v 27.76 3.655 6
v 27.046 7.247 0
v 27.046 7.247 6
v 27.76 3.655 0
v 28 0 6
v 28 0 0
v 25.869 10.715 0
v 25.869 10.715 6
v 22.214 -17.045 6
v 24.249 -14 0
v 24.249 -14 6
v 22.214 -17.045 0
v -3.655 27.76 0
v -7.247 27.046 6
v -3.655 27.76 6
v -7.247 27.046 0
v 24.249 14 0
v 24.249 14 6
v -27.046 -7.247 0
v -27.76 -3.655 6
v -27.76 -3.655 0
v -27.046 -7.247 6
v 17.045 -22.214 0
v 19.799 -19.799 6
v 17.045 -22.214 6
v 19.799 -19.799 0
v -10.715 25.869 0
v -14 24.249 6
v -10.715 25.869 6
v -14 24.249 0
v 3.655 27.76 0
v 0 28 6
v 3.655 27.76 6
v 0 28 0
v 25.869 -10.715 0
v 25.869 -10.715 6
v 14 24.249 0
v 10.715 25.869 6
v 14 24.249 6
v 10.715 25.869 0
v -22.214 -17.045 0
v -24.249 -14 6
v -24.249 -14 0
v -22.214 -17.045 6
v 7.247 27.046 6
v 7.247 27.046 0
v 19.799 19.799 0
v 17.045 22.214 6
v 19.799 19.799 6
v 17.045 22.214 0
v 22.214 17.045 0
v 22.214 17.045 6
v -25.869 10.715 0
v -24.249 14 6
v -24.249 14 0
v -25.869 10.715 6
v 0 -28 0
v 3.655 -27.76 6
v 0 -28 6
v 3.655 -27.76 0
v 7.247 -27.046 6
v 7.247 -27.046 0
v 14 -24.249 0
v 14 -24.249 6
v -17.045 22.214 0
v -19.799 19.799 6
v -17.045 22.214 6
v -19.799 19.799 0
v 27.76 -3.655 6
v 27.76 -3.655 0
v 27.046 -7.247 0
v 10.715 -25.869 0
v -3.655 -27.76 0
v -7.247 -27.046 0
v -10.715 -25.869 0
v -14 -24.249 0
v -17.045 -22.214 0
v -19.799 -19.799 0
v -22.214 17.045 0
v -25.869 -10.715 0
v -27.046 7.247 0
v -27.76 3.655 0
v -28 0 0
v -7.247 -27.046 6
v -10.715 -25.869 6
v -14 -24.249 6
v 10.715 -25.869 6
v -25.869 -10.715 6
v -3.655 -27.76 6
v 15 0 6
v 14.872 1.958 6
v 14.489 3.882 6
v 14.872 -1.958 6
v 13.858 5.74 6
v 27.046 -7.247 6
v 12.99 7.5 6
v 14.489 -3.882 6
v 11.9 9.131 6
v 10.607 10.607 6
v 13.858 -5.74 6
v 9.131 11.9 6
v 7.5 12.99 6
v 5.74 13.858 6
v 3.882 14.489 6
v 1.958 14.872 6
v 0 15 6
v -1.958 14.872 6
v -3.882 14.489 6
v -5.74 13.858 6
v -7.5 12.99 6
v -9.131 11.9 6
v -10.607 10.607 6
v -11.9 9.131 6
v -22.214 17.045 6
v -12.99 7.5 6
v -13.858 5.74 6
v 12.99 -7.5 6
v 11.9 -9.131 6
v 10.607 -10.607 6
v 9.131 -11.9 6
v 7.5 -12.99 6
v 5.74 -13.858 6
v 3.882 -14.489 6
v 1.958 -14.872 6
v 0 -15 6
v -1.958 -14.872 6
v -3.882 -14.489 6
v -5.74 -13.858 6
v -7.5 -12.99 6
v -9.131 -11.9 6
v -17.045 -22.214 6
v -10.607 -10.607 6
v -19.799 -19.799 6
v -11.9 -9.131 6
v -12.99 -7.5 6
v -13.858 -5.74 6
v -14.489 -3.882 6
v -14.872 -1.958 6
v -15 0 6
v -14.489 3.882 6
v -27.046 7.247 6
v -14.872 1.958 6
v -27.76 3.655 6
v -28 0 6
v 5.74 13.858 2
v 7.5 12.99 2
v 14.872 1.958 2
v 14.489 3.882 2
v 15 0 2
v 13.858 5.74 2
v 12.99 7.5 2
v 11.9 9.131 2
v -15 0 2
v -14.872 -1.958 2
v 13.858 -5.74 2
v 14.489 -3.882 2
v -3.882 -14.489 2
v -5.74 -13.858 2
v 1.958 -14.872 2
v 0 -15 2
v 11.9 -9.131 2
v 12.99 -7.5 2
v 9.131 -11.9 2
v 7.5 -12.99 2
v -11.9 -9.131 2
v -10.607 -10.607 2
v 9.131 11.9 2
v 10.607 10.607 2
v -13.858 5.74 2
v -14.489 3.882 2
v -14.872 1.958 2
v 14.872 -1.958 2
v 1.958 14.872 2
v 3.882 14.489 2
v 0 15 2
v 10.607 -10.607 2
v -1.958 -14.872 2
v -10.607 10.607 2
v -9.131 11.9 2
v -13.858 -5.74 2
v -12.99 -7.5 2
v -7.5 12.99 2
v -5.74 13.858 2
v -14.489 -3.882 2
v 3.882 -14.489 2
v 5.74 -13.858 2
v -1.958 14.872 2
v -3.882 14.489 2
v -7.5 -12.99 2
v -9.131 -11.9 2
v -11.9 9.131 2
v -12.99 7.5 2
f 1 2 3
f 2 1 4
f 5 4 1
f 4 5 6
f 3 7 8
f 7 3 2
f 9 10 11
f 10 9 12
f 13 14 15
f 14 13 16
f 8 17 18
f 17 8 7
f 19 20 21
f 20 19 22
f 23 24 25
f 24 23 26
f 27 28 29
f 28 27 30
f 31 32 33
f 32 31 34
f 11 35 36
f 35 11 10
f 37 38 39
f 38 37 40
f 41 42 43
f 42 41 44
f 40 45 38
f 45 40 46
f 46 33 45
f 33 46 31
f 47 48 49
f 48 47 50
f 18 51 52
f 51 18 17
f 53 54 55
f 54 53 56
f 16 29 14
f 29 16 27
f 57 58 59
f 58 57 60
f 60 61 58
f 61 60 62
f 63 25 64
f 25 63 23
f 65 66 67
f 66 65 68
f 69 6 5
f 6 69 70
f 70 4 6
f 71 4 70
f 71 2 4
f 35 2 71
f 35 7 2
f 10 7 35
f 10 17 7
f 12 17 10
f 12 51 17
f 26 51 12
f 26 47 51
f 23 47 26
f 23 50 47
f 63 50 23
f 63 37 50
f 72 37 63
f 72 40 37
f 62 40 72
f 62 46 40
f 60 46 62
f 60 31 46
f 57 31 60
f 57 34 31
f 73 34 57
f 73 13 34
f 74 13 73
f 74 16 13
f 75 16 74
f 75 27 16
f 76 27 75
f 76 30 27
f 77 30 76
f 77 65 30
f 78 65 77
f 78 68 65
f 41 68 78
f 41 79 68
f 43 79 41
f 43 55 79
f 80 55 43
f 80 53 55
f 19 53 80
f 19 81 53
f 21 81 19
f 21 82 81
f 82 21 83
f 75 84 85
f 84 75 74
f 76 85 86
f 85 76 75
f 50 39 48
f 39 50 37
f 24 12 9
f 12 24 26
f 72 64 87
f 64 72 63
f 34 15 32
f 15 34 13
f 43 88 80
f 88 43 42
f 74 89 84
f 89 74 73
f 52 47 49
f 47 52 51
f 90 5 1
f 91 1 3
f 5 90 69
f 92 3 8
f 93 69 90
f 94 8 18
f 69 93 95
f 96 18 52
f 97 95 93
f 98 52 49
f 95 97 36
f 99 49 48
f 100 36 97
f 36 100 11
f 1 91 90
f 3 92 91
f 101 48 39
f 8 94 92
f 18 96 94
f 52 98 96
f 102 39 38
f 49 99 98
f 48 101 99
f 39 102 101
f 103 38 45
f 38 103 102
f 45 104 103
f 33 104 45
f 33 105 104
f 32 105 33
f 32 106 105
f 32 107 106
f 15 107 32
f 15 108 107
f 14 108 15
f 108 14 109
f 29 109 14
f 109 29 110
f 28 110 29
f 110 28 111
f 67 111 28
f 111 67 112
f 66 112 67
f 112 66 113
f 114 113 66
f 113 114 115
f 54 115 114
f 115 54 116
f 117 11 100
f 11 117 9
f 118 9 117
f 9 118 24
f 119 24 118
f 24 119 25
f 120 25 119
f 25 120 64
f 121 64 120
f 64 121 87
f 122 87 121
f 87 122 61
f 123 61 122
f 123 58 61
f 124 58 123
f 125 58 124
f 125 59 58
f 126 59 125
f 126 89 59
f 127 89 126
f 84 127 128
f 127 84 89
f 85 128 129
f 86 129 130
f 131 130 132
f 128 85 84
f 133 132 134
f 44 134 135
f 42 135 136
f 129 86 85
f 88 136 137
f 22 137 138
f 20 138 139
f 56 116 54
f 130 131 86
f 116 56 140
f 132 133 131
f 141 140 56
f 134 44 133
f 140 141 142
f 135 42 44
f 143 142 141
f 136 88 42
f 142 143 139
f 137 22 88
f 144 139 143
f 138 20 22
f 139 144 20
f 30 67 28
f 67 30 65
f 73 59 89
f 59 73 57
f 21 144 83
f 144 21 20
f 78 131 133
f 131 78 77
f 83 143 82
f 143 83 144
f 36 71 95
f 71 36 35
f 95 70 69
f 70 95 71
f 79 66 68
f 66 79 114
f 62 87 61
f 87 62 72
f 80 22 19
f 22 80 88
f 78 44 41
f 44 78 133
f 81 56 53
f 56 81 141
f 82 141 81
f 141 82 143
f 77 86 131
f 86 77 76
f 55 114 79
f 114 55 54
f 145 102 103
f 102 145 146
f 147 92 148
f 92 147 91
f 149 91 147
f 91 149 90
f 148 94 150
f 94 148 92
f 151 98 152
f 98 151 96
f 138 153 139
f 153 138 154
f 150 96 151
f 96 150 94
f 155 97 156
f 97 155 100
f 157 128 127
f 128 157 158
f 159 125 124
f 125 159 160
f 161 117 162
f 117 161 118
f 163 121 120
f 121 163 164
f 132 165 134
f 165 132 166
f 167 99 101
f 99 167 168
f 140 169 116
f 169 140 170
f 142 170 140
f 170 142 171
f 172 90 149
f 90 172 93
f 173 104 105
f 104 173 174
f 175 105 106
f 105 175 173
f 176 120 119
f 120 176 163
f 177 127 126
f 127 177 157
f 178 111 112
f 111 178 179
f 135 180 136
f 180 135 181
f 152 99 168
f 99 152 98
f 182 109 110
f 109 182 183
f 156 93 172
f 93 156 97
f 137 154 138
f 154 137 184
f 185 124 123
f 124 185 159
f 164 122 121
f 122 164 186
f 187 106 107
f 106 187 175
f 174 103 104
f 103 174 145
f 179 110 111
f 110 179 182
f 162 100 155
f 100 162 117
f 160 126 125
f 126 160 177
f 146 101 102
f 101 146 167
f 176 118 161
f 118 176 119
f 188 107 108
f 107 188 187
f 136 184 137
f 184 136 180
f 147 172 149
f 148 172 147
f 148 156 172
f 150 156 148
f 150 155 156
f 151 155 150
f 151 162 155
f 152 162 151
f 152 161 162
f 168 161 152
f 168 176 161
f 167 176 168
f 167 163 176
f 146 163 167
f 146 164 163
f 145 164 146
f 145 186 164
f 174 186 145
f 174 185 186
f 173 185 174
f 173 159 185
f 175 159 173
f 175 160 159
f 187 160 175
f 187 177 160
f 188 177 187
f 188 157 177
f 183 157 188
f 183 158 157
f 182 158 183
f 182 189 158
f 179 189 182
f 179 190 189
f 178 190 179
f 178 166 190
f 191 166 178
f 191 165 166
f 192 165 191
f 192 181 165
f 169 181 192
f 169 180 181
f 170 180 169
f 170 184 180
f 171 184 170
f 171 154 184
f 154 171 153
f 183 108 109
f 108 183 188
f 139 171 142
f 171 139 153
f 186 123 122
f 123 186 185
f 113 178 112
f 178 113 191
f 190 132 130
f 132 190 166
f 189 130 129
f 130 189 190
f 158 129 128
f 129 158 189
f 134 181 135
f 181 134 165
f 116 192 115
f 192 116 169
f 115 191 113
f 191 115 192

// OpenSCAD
/*
HAP synthetic donor smoke fixture v0.1
Original test geometry. Not a GraviTrax donor mesh.

Used only by CI to prove that DONOR_CONVERTER_v0.1.scad can
import an external STL and fuse each supported underbody mount.
*/

$fn = 48;

difference() {
    cylinder(d=56.0,h=6.0);
    translate([0,0,2.0])
        cylinder(d=30.0,h=5.0);
}
